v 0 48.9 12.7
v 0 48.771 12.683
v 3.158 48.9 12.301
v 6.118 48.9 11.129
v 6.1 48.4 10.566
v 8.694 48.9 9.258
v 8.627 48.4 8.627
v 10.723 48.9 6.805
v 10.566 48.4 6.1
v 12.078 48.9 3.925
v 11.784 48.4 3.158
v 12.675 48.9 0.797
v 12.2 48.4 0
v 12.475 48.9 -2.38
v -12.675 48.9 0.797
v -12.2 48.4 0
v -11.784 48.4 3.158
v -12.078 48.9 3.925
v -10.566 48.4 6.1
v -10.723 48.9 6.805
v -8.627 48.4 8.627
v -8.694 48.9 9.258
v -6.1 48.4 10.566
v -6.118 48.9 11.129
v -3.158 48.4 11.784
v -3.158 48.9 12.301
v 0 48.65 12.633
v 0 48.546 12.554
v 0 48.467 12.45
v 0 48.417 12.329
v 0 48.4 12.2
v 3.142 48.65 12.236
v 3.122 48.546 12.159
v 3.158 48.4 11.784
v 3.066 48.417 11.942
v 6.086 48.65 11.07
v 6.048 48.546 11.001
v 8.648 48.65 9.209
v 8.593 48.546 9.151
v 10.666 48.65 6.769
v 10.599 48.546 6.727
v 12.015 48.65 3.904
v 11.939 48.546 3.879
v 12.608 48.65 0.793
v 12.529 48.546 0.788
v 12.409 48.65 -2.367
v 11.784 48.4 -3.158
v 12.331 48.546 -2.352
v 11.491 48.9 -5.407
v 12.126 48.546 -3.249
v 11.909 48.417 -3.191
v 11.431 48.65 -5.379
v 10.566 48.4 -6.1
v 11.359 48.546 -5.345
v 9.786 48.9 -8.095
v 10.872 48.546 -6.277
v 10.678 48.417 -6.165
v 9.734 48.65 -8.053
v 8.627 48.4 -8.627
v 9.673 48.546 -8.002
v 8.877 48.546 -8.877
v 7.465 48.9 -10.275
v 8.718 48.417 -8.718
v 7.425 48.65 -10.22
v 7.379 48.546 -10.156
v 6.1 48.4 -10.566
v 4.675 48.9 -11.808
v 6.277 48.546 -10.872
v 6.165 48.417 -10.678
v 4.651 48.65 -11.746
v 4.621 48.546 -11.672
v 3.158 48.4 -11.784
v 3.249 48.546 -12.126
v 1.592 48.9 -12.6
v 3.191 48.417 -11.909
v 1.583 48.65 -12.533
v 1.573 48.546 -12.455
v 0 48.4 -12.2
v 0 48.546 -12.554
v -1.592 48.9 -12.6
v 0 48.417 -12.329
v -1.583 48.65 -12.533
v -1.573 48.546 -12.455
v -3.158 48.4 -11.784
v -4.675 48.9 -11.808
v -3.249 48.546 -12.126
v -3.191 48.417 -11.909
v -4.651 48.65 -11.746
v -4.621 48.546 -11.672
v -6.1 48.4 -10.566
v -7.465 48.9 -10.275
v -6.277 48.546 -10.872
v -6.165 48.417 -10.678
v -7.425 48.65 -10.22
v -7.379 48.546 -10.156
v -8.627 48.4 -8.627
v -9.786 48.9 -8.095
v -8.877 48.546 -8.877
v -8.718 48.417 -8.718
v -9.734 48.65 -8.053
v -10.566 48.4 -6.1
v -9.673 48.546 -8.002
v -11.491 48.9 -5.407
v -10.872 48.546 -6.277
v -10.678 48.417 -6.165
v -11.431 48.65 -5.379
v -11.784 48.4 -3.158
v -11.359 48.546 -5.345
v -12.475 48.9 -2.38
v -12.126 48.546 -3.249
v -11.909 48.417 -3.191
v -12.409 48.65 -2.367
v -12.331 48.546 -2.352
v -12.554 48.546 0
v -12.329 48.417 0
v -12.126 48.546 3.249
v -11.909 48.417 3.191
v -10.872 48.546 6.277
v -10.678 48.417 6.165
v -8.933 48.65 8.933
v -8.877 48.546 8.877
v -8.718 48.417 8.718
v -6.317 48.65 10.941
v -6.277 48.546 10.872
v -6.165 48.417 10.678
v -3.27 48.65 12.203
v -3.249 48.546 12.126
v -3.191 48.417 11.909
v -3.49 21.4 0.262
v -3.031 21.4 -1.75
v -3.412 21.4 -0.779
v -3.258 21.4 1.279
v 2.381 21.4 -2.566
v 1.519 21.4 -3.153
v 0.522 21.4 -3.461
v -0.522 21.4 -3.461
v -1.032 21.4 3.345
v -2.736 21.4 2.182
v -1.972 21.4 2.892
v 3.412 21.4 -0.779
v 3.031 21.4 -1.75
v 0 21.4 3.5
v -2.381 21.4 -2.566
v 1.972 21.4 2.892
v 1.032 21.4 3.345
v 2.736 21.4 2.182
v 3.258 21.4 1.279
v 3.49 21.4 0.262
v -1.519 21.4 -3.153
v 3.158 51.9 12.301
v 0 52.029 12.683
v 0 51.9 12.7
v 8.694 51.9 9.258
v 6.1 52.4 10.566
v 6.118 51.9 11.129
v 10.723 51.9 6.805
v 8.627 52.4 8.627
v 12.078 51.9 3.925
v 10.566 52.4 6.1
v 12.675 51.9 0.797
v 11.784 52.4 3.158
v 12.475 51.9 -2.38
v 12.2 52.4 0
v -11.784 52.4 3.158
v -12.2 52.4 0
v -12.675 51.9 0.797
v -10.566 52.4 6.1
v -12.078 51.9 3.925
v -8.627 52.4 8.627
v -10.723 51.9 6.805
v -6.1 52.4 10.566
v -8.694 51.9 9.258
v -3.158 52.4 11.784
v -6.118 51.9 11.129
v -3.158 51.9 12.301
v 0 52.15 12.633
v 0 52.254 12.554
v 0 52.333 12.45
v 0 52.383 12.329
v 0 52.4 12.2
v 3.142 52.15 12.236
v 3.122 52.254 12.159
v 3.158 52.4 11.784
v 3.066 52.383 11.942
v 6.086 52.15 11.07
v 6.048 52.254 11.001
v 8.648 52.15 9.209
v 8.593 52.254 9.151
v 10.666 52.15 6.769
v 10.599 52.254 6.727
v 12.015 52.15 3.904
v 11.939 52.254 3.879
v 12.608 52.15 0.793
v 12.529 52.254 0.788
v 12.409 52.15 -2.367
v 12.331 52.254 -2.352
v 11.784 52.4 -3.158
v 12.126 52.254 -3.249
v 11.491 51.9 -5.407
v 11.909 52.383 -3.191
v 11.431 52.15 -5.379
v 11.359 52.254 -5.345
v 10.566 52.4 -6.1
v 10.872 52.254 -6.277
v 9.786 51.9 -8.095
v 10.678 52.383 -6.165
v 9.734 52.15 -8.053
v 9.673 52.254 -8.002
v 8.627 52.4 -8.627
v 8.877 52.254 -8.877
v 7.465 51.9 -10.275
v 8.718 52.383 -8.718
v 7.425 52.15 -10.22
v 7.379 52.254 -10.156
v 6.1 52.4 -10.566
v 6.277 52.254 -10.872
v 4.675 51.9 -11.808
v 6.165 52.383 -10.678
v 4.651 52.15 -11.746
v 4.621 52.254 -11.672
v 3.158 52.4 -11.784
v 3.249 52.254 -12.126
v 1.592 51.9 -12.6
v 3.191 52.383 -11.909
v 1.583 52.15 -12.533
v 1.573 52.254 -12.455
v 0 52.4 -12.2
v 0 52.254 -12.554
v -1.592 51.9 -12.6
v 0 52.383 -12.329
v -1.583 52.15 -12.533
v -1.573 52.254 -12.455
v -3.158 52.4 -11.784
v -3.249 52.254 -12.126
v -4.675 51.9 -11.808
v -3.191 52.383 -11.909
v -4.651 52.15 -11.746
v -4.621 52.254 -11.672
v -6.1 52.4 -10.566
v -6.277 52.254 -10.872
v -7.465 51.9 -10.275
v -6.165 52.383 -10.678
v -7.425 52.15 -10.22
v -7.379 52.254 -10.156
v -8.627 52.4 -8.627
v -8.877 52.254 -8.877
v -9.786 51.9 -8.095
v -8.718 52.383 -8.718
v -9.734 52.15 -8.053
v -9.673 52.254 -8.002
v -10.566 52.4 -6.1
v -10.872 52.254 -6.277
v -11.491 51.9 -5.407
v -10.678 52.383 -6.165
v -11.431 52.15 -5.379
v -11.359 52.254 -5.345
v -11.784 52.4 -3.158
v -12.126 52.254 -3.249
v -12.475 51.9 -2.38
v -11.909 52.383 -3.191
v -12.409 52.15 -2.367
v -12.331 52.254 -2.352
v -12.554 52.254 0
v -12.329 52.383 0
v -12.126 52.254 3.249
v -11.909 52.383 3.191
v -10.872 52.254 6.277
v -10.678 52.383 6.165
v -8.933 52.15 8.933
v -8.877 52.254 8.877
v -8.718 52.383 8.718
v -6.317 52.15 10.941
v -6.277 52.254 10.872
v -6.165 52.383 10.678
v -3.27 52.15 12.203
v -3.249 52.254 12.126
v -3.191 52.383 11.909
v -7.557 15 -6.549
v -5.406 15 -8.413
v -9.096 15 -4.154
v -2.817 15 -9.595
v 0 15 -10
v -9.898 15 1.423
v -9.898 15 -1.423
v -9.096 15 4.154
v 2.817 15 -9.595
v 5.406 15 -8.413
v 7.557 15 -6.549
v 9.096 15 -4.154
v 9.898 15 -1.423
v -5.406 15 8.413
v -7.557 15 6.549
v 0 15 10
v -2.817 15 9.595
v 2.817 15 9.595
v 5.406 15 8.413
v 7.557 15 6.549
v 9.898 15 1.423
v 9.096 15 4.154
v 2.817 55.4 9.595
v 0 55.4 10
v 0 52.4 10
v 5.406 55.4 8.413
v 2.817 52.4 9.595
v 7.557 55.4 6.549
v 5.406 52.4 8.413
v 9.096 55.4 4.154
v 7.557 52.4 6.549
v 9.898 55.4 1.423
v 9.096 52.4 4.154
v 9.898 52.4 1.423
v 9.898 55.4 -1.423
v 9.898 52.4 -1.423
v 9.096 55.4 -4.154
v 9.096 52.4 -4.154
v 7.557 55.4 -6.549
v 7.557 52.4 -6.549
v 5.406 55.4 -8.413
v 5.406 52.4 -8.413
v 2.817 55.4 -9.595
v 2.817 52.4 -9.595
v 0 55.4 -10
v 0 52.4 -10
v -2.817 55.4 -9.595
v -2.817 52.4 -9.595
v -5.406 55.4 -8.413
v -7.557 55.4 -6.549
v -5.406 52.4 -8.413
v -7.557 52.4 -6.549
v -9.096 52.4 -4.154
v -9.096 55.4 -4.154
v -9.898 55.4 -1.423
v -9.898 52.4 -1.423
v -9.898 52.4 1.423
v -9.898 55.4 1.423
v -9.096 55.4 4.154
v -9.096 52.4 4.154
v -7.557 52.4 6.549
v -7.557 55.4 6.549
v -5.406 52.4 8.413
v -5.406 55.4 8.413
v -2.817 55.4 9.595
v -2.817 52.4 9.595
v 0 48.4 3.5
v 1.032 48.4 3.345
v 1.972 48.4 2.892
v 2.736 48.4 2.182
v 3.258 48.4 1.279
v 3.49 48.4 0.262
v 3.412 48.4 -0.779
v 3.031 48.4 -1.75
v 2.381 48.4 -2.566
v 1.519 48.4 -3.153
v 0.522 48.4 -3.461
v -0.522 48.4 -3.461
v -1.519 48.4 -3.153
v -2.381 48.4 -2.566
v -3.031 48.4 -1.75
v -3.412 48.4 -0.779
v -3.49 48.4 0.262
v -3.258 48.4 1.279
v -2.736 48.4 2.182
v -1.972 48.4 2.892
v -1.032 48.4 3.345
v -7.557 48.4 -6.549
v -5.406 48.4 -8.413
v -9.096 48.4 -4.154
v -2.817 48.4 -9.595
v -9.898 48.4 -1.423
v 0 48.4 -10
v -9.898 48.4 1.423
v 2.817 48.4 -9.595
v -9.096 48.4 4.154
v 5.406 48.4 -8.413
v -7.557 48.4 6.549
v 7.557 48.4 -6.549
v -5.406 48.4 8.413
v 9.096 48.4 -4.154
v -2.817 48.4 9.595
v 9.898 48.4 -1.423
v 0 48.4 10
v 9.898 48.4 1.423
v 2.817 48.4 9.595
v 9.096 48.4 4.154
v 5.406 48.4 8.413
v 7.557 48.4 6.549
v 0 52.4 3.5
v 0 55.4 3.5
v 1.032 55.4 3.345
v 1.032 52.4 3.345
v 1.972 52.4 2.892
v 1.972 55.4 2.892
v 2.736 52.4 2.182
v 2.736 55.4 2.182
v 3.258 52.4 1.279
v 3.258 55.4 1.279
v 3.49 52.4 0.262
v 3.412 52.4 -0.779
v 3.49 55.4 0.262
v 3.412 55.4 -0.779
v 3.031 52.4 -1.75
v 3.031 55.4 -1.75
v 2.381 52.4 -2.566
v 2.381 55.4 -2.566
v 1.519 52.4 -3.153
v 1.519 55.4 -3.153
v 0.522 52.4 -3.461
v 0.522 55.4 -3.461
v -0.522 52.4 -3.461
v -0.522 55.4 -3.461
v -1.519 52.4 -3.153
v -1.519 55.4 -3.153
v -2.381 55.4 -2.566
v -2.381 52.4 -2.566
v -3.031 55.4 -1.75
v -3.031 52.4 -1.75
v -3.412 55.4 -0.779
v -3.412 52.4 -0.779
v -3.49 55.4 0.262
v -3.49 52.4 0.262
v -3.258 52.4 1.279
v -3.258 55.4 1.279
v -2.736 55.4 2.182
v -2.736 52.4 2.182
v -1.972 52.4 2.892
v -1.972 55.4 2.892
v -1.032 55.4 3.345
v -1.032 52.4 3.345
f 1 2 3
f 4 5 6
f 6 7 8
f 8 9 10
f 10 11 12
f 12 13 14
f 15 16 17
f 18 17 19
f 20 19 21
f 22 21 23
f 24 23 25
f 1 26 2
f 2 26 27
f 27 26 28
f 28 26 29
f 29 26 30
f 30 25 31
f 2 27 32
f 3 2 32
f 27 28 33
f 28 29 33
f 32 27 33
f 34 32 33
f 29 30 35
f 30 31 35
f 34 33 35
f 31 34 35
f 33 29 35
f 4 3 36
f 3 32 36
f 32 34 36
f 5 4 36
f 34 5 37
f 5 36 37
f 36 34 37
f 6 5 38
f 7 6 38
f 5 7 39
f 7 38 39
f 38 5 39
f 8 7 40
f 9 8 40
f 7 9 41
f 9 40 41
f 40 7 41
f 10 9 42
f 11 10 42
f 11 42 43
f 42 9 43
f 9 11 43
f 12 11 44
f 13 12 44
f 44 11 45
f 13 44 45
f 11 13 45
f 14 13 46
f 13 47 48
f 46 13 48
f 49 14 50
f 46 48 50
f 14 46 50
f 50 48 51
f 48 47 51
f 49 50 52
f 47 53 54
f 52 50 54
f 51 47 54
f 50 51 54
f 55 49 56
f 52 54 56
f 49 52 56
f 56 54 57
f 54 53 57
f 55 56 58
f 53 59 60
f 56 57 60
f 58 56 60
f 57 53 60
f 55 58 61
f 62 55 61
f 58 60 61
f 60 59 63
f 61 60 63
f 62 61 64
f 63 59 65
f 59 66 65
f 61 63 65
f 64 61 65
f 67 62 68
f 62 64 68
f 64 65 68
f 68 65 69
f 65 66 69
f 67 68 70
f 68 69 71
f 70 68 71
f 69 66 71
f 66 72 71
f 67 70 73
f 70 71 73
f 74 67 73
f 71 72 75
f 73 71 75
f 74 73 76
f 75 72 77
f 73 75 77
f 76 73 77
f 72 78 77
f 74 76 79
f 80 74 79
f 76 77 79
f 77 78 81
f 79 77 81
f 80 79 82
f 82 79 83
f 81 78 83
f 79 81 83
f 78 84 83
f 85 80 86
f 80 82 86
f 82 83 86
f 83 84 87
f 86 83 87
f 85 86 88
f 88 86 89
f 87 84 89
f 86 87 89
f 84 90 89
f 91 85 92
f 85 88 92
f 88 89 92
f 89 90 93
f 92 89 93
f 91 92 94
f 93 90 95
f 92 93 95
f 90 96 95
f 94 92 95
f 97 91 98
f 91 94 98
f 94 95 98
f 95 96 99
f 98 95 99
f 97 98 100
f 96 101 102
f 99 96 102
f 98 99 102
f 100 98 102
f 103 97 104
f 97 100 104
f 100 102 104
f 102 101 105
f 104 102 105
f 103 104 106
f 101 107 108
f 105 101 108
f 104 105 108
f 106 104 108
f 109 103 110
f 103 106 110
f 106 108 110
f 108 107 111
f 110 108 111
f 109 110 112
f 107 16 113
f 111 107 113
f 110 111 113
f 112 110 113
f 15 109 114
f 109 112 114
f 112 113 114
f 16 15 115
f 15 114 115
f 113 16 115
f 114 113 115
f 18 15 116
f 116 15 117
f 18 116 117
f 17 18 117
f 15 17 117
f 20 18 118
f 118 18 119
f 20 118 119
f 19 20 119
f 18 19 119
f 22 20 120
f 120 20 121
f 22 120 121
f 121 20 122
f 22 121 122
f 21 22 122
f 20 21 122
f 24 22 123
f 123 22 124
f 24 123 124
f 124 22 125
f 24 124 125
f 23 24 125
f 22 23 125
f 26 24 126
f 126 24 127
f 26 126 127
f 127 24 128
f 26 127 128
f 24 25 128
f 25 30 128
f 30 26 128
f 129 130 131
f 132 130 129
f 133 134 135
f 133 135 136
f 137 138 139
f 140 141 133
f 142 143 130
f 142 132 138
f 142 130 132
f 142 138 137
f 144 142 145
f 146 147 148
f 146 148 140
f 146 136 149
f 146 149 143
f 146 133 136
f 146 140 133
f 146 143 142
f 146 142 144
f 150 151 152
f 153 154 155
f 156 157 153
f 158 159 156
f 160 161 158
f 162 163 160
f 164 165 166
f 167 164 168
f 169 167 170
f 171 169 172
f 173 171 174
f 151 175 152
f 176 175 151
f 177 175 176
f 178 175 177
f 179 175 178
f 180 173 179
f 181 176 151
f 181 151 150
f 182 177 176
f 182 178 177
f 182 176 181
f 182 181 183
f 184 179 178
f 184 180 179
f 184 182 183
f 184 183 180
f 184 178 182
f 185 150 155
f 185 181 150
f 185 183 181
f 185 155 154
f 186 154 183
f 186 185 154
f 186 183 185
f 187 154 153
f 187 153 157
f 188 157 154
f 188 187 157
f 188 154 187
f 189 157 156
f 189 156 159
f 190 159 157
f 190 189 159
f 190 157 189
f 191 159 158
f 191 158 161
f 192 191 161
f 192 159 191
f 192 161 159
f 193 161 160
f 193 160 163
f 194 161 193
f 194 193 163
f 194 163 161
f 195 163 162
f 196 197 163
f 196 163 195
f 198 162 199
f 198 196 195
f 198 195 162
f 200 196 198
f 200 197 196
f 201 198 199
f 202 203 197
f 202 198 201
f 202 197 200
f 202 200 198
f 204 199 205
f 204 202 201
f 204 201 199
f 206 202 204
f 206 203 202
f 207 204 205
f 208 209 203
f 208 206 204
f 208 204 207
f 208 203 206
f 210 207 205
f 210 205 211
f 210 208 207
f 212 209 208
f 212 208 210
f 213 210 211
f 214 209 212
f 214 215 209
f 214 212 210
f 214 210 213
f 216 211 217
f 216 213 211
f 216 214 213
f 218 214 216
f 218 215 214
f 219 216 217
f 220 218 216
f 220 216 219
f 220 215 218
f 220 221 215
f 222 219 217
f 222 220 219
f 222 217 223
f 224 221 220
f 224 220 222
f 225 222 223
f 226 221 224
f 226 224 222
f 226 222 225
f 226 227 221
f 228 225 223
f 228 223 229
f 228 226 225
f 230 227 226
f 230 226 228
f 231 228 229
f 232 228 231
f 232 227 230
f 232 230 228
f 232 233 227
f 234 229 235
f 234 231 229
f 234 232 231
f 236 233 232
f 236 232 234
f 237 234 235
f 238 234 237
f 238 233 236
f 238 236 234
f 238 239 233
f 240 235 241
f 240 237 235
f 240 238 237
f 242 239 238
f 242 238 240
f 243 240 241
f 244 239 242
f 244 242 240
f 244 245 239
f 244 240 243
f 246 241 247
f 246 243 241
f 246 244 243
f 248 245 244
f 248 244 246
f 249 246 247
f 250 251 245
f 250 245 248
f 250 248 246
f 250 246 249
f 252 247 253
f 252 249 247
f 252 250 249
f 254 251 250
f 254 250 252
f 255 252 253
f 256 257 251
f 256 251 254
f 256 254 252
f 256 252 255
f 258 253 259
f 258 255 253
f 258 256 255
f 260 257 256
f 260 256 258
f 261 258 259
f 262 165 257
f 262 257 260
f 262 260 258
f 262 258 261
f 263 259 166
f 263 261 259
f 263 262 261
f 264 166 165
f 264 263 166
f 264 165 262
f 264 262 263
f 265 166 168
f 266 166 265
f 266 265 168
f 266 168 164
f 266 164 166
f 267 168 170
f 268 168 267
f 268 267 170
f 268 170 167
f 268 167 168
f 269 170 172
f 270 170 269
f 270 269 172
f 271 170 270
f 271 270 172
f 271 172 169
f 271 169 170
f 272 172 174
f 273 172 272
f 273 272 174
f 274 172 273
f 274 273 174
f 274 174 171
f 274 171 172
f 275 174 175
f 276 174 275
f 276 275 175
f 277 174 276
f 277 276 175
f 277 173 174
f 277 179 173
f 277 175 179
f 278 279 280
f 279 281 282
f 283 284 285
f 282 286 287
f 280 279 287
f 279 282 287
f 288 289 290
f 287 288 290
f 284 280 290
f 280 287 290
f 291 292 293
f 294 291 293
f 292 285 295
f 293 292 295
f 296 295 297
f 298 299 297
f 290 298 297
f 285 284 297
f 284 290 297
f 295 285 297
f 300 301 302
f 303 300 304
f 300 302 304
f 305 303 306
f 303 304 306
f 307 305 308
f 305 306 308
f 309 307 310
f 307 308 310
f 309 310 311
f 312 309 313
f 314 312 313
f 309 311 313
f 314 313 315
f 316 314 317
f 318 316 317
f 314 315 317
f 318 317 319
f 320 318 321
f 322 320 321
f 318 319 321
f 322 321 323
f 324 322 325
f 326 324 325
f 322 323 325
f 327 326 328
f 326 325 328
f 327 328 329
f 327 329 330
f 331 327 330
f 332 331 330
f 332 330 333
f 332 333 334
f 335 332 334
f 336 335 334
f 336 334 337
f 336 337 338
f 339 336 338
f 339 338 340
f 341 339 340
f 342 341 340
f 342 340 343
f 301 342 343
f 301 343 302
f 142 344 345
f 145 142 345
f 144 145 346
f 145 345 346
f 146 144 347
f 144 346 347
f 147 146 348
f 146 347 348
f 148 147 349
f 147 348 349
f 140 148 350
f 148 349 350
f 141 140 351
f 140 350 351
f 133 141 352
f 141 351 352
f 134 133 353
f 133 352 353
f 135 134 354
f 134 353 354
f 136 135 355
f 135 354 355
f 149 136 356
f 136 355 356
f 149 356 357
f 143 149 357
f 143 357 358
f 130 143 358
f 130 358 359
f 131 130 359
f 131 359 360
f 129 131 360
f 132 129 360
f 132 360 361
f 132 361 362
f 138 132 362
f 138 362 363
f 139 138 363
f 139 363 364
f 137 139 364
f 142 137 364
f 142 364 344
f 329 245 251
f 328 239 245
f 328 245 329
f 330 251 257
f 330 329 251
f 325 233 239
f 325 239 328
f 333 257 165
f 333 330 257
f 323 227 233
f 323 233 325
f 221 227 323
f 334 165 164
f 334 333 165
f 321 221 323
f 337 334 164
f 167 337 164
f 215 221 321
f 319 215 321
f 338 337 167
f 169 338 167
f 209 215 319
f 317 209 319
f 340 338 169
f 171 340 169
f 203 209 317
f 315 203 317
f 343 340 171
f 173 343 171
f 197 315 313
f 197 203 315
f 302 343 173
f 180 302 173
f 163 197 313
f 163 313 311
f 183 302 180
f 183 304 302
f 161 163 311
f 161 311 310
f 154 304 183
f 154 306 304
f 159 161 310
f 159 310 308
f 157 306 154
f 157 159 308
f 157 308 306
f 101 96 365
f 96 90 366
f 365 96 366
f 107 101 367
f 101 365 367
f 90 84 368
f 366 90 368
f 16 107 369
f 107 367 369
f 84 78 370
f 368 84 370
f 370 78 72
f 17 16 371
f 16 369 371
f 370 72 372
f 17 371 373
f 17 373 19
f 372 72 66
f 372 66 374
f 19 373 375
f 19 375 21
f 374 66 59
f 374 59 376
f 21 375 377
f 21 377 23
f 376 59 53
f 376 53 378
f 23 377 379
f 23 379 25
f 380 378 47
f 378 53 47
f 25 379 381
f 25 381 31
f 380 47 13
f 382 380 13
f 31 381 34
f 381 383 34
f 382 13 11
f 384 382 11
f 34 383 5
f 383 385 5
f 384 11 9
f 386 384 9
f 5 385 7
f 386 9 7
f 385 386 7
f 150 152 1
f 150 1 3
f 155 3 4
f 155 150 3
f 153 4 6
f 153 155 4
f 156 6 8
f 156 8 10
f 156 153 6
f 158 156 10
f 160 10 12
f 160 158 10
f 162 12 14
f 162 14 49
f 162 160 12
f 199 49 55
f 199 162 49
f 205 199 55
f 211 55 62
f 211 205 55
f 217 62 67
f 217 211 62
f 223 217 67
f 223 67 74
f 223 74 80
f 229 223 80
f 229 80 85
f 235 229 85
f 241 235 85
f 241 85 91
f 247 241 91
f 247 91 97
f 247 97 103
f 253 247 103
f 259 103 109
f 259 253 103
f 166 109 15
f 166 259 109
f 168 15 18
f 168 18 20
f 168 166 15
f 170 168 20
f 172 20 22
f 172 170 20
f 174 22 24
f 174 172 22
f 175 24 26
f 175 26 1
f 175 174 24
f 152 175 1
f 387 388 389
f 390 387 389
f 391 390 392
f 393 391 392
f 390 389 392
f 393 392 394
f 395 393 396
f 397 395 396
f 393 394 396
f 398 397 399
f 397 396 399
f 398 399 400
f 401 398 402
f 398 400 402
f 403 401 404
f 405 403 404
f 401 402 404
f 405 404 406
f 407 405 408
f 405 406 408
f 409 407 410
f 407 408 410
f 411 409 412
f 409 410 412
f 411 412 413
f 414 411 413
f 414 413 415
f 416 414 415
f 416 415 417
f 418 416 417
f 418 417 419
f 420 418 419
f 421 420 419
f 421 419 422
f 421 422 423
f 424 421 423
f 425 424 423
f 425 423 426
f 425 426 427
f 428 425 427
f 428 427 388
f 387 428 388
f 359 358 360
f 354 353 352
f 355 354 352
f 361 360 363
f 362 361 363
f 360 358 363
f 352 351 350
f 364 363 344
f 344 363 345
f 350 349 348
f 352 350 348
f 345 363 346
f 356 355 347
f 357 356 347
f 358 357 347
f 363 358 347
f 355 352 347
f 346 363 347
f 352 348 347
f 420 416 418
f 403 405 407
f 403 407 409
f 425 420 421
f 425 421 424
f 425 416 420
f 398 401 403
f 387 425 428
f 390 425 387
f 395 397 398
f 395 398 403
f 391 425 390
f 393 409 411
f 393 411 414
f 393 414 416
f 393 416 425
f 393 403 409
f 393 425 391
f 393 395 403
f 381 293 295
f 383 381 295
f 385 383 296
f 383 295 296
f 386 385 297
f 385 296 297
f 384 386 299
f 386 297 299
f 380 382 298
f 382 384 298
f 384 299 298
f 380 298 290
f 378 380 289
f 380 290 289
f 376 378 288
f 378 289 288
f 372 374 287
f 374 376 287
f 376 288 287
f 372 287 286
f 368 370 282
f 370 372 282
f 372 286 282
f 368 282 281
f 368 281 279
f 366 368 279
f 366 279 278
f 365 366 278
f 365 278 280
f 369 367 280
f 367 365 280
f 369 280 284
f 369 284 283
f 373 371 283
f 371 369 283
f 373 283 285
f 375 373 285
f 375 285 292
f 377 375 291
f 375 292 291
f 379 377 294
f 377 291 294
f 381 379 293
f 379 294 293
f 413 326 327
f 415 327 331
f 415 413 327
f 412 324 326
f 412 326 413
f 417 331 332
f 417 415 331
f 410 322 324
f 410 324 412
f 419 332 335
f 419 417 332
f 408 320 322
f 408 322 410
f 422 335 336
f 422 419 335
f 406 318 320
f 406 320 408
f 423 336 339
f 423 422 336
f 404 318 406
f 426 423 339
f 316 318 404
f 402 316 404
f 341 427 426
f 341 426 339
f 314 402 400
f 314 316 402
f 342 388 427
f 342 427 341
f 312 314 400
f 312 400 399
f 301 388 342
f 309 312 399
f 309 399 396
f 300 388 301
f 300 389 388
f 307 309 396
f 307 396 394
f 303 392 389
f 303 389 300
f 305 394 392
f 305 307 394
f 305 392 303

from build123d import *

# Parameters (mm, degrees)
EXTRUDE_START       = 15
SKETCH_1_R          = 10
EXTRUDE_1_DEPTH     = 40.4
SKETCH_2_R          = 3.5
CUT_EXTRUDE_1_DEPTH = 34
SKETCH_3_R          = 12.7
EXTRUDE_2_DEPTH     = 4
FILLET_4_R          = 0.5


with BuildPart() as part:
    # Эскиз1 → Вытянуть1 (new body)
    with BuildSketch(Plane(origin=(0, 0, 0), x_dir=(1, 0, 0), z_dir=(0, 1, 0)).offset(EXTRUDE_START)):
        with Locations(Location((0, 0, 0), (0, 0, 270))):
            Circle(SKETCH_1_R)
    extrude(amount=EXTRUDE_1_DEPTH)

    # Эскиз2 → Вырез-Вытянуть1 (cut)
    with BuildSketch(Plane(origin=(0, 55.4, 0), x_dir=(1, 0, 0), z_dir=(0, 1, 0))):
        with Locations(Location((0, 0, 0), (0, 0, 270))):
            Circle(SKETCH_2_R)
    extrude(amount=-CUT_EXTRUDE_1_DEPTH, mode=Mode.SUBTRACT)

    # Эскиз3 → Вытянуть2 (add)
    with BuildSketch(Plane(origin=(0, 52.4, 0), x_dir=(-1, 0, 0), z_dir=(0, 1, 0))):
        with Locations(Location((0, 0, 0), (0, 0, 90))):
            Circle(SKETCH_3_R)
    extrude(amount=-EXTRUDE_2_DEPTH)

    # Скругление4
    fillet_4_edges = [part.edges().sort_by_distance(p)[0] for p in [
        (0, 52.4, -12.7),
        (0, 48.4, -12.7),
    ]]
    fillet(fillet_4_edges, radius=FILLET_4_R)


solid = part.part
